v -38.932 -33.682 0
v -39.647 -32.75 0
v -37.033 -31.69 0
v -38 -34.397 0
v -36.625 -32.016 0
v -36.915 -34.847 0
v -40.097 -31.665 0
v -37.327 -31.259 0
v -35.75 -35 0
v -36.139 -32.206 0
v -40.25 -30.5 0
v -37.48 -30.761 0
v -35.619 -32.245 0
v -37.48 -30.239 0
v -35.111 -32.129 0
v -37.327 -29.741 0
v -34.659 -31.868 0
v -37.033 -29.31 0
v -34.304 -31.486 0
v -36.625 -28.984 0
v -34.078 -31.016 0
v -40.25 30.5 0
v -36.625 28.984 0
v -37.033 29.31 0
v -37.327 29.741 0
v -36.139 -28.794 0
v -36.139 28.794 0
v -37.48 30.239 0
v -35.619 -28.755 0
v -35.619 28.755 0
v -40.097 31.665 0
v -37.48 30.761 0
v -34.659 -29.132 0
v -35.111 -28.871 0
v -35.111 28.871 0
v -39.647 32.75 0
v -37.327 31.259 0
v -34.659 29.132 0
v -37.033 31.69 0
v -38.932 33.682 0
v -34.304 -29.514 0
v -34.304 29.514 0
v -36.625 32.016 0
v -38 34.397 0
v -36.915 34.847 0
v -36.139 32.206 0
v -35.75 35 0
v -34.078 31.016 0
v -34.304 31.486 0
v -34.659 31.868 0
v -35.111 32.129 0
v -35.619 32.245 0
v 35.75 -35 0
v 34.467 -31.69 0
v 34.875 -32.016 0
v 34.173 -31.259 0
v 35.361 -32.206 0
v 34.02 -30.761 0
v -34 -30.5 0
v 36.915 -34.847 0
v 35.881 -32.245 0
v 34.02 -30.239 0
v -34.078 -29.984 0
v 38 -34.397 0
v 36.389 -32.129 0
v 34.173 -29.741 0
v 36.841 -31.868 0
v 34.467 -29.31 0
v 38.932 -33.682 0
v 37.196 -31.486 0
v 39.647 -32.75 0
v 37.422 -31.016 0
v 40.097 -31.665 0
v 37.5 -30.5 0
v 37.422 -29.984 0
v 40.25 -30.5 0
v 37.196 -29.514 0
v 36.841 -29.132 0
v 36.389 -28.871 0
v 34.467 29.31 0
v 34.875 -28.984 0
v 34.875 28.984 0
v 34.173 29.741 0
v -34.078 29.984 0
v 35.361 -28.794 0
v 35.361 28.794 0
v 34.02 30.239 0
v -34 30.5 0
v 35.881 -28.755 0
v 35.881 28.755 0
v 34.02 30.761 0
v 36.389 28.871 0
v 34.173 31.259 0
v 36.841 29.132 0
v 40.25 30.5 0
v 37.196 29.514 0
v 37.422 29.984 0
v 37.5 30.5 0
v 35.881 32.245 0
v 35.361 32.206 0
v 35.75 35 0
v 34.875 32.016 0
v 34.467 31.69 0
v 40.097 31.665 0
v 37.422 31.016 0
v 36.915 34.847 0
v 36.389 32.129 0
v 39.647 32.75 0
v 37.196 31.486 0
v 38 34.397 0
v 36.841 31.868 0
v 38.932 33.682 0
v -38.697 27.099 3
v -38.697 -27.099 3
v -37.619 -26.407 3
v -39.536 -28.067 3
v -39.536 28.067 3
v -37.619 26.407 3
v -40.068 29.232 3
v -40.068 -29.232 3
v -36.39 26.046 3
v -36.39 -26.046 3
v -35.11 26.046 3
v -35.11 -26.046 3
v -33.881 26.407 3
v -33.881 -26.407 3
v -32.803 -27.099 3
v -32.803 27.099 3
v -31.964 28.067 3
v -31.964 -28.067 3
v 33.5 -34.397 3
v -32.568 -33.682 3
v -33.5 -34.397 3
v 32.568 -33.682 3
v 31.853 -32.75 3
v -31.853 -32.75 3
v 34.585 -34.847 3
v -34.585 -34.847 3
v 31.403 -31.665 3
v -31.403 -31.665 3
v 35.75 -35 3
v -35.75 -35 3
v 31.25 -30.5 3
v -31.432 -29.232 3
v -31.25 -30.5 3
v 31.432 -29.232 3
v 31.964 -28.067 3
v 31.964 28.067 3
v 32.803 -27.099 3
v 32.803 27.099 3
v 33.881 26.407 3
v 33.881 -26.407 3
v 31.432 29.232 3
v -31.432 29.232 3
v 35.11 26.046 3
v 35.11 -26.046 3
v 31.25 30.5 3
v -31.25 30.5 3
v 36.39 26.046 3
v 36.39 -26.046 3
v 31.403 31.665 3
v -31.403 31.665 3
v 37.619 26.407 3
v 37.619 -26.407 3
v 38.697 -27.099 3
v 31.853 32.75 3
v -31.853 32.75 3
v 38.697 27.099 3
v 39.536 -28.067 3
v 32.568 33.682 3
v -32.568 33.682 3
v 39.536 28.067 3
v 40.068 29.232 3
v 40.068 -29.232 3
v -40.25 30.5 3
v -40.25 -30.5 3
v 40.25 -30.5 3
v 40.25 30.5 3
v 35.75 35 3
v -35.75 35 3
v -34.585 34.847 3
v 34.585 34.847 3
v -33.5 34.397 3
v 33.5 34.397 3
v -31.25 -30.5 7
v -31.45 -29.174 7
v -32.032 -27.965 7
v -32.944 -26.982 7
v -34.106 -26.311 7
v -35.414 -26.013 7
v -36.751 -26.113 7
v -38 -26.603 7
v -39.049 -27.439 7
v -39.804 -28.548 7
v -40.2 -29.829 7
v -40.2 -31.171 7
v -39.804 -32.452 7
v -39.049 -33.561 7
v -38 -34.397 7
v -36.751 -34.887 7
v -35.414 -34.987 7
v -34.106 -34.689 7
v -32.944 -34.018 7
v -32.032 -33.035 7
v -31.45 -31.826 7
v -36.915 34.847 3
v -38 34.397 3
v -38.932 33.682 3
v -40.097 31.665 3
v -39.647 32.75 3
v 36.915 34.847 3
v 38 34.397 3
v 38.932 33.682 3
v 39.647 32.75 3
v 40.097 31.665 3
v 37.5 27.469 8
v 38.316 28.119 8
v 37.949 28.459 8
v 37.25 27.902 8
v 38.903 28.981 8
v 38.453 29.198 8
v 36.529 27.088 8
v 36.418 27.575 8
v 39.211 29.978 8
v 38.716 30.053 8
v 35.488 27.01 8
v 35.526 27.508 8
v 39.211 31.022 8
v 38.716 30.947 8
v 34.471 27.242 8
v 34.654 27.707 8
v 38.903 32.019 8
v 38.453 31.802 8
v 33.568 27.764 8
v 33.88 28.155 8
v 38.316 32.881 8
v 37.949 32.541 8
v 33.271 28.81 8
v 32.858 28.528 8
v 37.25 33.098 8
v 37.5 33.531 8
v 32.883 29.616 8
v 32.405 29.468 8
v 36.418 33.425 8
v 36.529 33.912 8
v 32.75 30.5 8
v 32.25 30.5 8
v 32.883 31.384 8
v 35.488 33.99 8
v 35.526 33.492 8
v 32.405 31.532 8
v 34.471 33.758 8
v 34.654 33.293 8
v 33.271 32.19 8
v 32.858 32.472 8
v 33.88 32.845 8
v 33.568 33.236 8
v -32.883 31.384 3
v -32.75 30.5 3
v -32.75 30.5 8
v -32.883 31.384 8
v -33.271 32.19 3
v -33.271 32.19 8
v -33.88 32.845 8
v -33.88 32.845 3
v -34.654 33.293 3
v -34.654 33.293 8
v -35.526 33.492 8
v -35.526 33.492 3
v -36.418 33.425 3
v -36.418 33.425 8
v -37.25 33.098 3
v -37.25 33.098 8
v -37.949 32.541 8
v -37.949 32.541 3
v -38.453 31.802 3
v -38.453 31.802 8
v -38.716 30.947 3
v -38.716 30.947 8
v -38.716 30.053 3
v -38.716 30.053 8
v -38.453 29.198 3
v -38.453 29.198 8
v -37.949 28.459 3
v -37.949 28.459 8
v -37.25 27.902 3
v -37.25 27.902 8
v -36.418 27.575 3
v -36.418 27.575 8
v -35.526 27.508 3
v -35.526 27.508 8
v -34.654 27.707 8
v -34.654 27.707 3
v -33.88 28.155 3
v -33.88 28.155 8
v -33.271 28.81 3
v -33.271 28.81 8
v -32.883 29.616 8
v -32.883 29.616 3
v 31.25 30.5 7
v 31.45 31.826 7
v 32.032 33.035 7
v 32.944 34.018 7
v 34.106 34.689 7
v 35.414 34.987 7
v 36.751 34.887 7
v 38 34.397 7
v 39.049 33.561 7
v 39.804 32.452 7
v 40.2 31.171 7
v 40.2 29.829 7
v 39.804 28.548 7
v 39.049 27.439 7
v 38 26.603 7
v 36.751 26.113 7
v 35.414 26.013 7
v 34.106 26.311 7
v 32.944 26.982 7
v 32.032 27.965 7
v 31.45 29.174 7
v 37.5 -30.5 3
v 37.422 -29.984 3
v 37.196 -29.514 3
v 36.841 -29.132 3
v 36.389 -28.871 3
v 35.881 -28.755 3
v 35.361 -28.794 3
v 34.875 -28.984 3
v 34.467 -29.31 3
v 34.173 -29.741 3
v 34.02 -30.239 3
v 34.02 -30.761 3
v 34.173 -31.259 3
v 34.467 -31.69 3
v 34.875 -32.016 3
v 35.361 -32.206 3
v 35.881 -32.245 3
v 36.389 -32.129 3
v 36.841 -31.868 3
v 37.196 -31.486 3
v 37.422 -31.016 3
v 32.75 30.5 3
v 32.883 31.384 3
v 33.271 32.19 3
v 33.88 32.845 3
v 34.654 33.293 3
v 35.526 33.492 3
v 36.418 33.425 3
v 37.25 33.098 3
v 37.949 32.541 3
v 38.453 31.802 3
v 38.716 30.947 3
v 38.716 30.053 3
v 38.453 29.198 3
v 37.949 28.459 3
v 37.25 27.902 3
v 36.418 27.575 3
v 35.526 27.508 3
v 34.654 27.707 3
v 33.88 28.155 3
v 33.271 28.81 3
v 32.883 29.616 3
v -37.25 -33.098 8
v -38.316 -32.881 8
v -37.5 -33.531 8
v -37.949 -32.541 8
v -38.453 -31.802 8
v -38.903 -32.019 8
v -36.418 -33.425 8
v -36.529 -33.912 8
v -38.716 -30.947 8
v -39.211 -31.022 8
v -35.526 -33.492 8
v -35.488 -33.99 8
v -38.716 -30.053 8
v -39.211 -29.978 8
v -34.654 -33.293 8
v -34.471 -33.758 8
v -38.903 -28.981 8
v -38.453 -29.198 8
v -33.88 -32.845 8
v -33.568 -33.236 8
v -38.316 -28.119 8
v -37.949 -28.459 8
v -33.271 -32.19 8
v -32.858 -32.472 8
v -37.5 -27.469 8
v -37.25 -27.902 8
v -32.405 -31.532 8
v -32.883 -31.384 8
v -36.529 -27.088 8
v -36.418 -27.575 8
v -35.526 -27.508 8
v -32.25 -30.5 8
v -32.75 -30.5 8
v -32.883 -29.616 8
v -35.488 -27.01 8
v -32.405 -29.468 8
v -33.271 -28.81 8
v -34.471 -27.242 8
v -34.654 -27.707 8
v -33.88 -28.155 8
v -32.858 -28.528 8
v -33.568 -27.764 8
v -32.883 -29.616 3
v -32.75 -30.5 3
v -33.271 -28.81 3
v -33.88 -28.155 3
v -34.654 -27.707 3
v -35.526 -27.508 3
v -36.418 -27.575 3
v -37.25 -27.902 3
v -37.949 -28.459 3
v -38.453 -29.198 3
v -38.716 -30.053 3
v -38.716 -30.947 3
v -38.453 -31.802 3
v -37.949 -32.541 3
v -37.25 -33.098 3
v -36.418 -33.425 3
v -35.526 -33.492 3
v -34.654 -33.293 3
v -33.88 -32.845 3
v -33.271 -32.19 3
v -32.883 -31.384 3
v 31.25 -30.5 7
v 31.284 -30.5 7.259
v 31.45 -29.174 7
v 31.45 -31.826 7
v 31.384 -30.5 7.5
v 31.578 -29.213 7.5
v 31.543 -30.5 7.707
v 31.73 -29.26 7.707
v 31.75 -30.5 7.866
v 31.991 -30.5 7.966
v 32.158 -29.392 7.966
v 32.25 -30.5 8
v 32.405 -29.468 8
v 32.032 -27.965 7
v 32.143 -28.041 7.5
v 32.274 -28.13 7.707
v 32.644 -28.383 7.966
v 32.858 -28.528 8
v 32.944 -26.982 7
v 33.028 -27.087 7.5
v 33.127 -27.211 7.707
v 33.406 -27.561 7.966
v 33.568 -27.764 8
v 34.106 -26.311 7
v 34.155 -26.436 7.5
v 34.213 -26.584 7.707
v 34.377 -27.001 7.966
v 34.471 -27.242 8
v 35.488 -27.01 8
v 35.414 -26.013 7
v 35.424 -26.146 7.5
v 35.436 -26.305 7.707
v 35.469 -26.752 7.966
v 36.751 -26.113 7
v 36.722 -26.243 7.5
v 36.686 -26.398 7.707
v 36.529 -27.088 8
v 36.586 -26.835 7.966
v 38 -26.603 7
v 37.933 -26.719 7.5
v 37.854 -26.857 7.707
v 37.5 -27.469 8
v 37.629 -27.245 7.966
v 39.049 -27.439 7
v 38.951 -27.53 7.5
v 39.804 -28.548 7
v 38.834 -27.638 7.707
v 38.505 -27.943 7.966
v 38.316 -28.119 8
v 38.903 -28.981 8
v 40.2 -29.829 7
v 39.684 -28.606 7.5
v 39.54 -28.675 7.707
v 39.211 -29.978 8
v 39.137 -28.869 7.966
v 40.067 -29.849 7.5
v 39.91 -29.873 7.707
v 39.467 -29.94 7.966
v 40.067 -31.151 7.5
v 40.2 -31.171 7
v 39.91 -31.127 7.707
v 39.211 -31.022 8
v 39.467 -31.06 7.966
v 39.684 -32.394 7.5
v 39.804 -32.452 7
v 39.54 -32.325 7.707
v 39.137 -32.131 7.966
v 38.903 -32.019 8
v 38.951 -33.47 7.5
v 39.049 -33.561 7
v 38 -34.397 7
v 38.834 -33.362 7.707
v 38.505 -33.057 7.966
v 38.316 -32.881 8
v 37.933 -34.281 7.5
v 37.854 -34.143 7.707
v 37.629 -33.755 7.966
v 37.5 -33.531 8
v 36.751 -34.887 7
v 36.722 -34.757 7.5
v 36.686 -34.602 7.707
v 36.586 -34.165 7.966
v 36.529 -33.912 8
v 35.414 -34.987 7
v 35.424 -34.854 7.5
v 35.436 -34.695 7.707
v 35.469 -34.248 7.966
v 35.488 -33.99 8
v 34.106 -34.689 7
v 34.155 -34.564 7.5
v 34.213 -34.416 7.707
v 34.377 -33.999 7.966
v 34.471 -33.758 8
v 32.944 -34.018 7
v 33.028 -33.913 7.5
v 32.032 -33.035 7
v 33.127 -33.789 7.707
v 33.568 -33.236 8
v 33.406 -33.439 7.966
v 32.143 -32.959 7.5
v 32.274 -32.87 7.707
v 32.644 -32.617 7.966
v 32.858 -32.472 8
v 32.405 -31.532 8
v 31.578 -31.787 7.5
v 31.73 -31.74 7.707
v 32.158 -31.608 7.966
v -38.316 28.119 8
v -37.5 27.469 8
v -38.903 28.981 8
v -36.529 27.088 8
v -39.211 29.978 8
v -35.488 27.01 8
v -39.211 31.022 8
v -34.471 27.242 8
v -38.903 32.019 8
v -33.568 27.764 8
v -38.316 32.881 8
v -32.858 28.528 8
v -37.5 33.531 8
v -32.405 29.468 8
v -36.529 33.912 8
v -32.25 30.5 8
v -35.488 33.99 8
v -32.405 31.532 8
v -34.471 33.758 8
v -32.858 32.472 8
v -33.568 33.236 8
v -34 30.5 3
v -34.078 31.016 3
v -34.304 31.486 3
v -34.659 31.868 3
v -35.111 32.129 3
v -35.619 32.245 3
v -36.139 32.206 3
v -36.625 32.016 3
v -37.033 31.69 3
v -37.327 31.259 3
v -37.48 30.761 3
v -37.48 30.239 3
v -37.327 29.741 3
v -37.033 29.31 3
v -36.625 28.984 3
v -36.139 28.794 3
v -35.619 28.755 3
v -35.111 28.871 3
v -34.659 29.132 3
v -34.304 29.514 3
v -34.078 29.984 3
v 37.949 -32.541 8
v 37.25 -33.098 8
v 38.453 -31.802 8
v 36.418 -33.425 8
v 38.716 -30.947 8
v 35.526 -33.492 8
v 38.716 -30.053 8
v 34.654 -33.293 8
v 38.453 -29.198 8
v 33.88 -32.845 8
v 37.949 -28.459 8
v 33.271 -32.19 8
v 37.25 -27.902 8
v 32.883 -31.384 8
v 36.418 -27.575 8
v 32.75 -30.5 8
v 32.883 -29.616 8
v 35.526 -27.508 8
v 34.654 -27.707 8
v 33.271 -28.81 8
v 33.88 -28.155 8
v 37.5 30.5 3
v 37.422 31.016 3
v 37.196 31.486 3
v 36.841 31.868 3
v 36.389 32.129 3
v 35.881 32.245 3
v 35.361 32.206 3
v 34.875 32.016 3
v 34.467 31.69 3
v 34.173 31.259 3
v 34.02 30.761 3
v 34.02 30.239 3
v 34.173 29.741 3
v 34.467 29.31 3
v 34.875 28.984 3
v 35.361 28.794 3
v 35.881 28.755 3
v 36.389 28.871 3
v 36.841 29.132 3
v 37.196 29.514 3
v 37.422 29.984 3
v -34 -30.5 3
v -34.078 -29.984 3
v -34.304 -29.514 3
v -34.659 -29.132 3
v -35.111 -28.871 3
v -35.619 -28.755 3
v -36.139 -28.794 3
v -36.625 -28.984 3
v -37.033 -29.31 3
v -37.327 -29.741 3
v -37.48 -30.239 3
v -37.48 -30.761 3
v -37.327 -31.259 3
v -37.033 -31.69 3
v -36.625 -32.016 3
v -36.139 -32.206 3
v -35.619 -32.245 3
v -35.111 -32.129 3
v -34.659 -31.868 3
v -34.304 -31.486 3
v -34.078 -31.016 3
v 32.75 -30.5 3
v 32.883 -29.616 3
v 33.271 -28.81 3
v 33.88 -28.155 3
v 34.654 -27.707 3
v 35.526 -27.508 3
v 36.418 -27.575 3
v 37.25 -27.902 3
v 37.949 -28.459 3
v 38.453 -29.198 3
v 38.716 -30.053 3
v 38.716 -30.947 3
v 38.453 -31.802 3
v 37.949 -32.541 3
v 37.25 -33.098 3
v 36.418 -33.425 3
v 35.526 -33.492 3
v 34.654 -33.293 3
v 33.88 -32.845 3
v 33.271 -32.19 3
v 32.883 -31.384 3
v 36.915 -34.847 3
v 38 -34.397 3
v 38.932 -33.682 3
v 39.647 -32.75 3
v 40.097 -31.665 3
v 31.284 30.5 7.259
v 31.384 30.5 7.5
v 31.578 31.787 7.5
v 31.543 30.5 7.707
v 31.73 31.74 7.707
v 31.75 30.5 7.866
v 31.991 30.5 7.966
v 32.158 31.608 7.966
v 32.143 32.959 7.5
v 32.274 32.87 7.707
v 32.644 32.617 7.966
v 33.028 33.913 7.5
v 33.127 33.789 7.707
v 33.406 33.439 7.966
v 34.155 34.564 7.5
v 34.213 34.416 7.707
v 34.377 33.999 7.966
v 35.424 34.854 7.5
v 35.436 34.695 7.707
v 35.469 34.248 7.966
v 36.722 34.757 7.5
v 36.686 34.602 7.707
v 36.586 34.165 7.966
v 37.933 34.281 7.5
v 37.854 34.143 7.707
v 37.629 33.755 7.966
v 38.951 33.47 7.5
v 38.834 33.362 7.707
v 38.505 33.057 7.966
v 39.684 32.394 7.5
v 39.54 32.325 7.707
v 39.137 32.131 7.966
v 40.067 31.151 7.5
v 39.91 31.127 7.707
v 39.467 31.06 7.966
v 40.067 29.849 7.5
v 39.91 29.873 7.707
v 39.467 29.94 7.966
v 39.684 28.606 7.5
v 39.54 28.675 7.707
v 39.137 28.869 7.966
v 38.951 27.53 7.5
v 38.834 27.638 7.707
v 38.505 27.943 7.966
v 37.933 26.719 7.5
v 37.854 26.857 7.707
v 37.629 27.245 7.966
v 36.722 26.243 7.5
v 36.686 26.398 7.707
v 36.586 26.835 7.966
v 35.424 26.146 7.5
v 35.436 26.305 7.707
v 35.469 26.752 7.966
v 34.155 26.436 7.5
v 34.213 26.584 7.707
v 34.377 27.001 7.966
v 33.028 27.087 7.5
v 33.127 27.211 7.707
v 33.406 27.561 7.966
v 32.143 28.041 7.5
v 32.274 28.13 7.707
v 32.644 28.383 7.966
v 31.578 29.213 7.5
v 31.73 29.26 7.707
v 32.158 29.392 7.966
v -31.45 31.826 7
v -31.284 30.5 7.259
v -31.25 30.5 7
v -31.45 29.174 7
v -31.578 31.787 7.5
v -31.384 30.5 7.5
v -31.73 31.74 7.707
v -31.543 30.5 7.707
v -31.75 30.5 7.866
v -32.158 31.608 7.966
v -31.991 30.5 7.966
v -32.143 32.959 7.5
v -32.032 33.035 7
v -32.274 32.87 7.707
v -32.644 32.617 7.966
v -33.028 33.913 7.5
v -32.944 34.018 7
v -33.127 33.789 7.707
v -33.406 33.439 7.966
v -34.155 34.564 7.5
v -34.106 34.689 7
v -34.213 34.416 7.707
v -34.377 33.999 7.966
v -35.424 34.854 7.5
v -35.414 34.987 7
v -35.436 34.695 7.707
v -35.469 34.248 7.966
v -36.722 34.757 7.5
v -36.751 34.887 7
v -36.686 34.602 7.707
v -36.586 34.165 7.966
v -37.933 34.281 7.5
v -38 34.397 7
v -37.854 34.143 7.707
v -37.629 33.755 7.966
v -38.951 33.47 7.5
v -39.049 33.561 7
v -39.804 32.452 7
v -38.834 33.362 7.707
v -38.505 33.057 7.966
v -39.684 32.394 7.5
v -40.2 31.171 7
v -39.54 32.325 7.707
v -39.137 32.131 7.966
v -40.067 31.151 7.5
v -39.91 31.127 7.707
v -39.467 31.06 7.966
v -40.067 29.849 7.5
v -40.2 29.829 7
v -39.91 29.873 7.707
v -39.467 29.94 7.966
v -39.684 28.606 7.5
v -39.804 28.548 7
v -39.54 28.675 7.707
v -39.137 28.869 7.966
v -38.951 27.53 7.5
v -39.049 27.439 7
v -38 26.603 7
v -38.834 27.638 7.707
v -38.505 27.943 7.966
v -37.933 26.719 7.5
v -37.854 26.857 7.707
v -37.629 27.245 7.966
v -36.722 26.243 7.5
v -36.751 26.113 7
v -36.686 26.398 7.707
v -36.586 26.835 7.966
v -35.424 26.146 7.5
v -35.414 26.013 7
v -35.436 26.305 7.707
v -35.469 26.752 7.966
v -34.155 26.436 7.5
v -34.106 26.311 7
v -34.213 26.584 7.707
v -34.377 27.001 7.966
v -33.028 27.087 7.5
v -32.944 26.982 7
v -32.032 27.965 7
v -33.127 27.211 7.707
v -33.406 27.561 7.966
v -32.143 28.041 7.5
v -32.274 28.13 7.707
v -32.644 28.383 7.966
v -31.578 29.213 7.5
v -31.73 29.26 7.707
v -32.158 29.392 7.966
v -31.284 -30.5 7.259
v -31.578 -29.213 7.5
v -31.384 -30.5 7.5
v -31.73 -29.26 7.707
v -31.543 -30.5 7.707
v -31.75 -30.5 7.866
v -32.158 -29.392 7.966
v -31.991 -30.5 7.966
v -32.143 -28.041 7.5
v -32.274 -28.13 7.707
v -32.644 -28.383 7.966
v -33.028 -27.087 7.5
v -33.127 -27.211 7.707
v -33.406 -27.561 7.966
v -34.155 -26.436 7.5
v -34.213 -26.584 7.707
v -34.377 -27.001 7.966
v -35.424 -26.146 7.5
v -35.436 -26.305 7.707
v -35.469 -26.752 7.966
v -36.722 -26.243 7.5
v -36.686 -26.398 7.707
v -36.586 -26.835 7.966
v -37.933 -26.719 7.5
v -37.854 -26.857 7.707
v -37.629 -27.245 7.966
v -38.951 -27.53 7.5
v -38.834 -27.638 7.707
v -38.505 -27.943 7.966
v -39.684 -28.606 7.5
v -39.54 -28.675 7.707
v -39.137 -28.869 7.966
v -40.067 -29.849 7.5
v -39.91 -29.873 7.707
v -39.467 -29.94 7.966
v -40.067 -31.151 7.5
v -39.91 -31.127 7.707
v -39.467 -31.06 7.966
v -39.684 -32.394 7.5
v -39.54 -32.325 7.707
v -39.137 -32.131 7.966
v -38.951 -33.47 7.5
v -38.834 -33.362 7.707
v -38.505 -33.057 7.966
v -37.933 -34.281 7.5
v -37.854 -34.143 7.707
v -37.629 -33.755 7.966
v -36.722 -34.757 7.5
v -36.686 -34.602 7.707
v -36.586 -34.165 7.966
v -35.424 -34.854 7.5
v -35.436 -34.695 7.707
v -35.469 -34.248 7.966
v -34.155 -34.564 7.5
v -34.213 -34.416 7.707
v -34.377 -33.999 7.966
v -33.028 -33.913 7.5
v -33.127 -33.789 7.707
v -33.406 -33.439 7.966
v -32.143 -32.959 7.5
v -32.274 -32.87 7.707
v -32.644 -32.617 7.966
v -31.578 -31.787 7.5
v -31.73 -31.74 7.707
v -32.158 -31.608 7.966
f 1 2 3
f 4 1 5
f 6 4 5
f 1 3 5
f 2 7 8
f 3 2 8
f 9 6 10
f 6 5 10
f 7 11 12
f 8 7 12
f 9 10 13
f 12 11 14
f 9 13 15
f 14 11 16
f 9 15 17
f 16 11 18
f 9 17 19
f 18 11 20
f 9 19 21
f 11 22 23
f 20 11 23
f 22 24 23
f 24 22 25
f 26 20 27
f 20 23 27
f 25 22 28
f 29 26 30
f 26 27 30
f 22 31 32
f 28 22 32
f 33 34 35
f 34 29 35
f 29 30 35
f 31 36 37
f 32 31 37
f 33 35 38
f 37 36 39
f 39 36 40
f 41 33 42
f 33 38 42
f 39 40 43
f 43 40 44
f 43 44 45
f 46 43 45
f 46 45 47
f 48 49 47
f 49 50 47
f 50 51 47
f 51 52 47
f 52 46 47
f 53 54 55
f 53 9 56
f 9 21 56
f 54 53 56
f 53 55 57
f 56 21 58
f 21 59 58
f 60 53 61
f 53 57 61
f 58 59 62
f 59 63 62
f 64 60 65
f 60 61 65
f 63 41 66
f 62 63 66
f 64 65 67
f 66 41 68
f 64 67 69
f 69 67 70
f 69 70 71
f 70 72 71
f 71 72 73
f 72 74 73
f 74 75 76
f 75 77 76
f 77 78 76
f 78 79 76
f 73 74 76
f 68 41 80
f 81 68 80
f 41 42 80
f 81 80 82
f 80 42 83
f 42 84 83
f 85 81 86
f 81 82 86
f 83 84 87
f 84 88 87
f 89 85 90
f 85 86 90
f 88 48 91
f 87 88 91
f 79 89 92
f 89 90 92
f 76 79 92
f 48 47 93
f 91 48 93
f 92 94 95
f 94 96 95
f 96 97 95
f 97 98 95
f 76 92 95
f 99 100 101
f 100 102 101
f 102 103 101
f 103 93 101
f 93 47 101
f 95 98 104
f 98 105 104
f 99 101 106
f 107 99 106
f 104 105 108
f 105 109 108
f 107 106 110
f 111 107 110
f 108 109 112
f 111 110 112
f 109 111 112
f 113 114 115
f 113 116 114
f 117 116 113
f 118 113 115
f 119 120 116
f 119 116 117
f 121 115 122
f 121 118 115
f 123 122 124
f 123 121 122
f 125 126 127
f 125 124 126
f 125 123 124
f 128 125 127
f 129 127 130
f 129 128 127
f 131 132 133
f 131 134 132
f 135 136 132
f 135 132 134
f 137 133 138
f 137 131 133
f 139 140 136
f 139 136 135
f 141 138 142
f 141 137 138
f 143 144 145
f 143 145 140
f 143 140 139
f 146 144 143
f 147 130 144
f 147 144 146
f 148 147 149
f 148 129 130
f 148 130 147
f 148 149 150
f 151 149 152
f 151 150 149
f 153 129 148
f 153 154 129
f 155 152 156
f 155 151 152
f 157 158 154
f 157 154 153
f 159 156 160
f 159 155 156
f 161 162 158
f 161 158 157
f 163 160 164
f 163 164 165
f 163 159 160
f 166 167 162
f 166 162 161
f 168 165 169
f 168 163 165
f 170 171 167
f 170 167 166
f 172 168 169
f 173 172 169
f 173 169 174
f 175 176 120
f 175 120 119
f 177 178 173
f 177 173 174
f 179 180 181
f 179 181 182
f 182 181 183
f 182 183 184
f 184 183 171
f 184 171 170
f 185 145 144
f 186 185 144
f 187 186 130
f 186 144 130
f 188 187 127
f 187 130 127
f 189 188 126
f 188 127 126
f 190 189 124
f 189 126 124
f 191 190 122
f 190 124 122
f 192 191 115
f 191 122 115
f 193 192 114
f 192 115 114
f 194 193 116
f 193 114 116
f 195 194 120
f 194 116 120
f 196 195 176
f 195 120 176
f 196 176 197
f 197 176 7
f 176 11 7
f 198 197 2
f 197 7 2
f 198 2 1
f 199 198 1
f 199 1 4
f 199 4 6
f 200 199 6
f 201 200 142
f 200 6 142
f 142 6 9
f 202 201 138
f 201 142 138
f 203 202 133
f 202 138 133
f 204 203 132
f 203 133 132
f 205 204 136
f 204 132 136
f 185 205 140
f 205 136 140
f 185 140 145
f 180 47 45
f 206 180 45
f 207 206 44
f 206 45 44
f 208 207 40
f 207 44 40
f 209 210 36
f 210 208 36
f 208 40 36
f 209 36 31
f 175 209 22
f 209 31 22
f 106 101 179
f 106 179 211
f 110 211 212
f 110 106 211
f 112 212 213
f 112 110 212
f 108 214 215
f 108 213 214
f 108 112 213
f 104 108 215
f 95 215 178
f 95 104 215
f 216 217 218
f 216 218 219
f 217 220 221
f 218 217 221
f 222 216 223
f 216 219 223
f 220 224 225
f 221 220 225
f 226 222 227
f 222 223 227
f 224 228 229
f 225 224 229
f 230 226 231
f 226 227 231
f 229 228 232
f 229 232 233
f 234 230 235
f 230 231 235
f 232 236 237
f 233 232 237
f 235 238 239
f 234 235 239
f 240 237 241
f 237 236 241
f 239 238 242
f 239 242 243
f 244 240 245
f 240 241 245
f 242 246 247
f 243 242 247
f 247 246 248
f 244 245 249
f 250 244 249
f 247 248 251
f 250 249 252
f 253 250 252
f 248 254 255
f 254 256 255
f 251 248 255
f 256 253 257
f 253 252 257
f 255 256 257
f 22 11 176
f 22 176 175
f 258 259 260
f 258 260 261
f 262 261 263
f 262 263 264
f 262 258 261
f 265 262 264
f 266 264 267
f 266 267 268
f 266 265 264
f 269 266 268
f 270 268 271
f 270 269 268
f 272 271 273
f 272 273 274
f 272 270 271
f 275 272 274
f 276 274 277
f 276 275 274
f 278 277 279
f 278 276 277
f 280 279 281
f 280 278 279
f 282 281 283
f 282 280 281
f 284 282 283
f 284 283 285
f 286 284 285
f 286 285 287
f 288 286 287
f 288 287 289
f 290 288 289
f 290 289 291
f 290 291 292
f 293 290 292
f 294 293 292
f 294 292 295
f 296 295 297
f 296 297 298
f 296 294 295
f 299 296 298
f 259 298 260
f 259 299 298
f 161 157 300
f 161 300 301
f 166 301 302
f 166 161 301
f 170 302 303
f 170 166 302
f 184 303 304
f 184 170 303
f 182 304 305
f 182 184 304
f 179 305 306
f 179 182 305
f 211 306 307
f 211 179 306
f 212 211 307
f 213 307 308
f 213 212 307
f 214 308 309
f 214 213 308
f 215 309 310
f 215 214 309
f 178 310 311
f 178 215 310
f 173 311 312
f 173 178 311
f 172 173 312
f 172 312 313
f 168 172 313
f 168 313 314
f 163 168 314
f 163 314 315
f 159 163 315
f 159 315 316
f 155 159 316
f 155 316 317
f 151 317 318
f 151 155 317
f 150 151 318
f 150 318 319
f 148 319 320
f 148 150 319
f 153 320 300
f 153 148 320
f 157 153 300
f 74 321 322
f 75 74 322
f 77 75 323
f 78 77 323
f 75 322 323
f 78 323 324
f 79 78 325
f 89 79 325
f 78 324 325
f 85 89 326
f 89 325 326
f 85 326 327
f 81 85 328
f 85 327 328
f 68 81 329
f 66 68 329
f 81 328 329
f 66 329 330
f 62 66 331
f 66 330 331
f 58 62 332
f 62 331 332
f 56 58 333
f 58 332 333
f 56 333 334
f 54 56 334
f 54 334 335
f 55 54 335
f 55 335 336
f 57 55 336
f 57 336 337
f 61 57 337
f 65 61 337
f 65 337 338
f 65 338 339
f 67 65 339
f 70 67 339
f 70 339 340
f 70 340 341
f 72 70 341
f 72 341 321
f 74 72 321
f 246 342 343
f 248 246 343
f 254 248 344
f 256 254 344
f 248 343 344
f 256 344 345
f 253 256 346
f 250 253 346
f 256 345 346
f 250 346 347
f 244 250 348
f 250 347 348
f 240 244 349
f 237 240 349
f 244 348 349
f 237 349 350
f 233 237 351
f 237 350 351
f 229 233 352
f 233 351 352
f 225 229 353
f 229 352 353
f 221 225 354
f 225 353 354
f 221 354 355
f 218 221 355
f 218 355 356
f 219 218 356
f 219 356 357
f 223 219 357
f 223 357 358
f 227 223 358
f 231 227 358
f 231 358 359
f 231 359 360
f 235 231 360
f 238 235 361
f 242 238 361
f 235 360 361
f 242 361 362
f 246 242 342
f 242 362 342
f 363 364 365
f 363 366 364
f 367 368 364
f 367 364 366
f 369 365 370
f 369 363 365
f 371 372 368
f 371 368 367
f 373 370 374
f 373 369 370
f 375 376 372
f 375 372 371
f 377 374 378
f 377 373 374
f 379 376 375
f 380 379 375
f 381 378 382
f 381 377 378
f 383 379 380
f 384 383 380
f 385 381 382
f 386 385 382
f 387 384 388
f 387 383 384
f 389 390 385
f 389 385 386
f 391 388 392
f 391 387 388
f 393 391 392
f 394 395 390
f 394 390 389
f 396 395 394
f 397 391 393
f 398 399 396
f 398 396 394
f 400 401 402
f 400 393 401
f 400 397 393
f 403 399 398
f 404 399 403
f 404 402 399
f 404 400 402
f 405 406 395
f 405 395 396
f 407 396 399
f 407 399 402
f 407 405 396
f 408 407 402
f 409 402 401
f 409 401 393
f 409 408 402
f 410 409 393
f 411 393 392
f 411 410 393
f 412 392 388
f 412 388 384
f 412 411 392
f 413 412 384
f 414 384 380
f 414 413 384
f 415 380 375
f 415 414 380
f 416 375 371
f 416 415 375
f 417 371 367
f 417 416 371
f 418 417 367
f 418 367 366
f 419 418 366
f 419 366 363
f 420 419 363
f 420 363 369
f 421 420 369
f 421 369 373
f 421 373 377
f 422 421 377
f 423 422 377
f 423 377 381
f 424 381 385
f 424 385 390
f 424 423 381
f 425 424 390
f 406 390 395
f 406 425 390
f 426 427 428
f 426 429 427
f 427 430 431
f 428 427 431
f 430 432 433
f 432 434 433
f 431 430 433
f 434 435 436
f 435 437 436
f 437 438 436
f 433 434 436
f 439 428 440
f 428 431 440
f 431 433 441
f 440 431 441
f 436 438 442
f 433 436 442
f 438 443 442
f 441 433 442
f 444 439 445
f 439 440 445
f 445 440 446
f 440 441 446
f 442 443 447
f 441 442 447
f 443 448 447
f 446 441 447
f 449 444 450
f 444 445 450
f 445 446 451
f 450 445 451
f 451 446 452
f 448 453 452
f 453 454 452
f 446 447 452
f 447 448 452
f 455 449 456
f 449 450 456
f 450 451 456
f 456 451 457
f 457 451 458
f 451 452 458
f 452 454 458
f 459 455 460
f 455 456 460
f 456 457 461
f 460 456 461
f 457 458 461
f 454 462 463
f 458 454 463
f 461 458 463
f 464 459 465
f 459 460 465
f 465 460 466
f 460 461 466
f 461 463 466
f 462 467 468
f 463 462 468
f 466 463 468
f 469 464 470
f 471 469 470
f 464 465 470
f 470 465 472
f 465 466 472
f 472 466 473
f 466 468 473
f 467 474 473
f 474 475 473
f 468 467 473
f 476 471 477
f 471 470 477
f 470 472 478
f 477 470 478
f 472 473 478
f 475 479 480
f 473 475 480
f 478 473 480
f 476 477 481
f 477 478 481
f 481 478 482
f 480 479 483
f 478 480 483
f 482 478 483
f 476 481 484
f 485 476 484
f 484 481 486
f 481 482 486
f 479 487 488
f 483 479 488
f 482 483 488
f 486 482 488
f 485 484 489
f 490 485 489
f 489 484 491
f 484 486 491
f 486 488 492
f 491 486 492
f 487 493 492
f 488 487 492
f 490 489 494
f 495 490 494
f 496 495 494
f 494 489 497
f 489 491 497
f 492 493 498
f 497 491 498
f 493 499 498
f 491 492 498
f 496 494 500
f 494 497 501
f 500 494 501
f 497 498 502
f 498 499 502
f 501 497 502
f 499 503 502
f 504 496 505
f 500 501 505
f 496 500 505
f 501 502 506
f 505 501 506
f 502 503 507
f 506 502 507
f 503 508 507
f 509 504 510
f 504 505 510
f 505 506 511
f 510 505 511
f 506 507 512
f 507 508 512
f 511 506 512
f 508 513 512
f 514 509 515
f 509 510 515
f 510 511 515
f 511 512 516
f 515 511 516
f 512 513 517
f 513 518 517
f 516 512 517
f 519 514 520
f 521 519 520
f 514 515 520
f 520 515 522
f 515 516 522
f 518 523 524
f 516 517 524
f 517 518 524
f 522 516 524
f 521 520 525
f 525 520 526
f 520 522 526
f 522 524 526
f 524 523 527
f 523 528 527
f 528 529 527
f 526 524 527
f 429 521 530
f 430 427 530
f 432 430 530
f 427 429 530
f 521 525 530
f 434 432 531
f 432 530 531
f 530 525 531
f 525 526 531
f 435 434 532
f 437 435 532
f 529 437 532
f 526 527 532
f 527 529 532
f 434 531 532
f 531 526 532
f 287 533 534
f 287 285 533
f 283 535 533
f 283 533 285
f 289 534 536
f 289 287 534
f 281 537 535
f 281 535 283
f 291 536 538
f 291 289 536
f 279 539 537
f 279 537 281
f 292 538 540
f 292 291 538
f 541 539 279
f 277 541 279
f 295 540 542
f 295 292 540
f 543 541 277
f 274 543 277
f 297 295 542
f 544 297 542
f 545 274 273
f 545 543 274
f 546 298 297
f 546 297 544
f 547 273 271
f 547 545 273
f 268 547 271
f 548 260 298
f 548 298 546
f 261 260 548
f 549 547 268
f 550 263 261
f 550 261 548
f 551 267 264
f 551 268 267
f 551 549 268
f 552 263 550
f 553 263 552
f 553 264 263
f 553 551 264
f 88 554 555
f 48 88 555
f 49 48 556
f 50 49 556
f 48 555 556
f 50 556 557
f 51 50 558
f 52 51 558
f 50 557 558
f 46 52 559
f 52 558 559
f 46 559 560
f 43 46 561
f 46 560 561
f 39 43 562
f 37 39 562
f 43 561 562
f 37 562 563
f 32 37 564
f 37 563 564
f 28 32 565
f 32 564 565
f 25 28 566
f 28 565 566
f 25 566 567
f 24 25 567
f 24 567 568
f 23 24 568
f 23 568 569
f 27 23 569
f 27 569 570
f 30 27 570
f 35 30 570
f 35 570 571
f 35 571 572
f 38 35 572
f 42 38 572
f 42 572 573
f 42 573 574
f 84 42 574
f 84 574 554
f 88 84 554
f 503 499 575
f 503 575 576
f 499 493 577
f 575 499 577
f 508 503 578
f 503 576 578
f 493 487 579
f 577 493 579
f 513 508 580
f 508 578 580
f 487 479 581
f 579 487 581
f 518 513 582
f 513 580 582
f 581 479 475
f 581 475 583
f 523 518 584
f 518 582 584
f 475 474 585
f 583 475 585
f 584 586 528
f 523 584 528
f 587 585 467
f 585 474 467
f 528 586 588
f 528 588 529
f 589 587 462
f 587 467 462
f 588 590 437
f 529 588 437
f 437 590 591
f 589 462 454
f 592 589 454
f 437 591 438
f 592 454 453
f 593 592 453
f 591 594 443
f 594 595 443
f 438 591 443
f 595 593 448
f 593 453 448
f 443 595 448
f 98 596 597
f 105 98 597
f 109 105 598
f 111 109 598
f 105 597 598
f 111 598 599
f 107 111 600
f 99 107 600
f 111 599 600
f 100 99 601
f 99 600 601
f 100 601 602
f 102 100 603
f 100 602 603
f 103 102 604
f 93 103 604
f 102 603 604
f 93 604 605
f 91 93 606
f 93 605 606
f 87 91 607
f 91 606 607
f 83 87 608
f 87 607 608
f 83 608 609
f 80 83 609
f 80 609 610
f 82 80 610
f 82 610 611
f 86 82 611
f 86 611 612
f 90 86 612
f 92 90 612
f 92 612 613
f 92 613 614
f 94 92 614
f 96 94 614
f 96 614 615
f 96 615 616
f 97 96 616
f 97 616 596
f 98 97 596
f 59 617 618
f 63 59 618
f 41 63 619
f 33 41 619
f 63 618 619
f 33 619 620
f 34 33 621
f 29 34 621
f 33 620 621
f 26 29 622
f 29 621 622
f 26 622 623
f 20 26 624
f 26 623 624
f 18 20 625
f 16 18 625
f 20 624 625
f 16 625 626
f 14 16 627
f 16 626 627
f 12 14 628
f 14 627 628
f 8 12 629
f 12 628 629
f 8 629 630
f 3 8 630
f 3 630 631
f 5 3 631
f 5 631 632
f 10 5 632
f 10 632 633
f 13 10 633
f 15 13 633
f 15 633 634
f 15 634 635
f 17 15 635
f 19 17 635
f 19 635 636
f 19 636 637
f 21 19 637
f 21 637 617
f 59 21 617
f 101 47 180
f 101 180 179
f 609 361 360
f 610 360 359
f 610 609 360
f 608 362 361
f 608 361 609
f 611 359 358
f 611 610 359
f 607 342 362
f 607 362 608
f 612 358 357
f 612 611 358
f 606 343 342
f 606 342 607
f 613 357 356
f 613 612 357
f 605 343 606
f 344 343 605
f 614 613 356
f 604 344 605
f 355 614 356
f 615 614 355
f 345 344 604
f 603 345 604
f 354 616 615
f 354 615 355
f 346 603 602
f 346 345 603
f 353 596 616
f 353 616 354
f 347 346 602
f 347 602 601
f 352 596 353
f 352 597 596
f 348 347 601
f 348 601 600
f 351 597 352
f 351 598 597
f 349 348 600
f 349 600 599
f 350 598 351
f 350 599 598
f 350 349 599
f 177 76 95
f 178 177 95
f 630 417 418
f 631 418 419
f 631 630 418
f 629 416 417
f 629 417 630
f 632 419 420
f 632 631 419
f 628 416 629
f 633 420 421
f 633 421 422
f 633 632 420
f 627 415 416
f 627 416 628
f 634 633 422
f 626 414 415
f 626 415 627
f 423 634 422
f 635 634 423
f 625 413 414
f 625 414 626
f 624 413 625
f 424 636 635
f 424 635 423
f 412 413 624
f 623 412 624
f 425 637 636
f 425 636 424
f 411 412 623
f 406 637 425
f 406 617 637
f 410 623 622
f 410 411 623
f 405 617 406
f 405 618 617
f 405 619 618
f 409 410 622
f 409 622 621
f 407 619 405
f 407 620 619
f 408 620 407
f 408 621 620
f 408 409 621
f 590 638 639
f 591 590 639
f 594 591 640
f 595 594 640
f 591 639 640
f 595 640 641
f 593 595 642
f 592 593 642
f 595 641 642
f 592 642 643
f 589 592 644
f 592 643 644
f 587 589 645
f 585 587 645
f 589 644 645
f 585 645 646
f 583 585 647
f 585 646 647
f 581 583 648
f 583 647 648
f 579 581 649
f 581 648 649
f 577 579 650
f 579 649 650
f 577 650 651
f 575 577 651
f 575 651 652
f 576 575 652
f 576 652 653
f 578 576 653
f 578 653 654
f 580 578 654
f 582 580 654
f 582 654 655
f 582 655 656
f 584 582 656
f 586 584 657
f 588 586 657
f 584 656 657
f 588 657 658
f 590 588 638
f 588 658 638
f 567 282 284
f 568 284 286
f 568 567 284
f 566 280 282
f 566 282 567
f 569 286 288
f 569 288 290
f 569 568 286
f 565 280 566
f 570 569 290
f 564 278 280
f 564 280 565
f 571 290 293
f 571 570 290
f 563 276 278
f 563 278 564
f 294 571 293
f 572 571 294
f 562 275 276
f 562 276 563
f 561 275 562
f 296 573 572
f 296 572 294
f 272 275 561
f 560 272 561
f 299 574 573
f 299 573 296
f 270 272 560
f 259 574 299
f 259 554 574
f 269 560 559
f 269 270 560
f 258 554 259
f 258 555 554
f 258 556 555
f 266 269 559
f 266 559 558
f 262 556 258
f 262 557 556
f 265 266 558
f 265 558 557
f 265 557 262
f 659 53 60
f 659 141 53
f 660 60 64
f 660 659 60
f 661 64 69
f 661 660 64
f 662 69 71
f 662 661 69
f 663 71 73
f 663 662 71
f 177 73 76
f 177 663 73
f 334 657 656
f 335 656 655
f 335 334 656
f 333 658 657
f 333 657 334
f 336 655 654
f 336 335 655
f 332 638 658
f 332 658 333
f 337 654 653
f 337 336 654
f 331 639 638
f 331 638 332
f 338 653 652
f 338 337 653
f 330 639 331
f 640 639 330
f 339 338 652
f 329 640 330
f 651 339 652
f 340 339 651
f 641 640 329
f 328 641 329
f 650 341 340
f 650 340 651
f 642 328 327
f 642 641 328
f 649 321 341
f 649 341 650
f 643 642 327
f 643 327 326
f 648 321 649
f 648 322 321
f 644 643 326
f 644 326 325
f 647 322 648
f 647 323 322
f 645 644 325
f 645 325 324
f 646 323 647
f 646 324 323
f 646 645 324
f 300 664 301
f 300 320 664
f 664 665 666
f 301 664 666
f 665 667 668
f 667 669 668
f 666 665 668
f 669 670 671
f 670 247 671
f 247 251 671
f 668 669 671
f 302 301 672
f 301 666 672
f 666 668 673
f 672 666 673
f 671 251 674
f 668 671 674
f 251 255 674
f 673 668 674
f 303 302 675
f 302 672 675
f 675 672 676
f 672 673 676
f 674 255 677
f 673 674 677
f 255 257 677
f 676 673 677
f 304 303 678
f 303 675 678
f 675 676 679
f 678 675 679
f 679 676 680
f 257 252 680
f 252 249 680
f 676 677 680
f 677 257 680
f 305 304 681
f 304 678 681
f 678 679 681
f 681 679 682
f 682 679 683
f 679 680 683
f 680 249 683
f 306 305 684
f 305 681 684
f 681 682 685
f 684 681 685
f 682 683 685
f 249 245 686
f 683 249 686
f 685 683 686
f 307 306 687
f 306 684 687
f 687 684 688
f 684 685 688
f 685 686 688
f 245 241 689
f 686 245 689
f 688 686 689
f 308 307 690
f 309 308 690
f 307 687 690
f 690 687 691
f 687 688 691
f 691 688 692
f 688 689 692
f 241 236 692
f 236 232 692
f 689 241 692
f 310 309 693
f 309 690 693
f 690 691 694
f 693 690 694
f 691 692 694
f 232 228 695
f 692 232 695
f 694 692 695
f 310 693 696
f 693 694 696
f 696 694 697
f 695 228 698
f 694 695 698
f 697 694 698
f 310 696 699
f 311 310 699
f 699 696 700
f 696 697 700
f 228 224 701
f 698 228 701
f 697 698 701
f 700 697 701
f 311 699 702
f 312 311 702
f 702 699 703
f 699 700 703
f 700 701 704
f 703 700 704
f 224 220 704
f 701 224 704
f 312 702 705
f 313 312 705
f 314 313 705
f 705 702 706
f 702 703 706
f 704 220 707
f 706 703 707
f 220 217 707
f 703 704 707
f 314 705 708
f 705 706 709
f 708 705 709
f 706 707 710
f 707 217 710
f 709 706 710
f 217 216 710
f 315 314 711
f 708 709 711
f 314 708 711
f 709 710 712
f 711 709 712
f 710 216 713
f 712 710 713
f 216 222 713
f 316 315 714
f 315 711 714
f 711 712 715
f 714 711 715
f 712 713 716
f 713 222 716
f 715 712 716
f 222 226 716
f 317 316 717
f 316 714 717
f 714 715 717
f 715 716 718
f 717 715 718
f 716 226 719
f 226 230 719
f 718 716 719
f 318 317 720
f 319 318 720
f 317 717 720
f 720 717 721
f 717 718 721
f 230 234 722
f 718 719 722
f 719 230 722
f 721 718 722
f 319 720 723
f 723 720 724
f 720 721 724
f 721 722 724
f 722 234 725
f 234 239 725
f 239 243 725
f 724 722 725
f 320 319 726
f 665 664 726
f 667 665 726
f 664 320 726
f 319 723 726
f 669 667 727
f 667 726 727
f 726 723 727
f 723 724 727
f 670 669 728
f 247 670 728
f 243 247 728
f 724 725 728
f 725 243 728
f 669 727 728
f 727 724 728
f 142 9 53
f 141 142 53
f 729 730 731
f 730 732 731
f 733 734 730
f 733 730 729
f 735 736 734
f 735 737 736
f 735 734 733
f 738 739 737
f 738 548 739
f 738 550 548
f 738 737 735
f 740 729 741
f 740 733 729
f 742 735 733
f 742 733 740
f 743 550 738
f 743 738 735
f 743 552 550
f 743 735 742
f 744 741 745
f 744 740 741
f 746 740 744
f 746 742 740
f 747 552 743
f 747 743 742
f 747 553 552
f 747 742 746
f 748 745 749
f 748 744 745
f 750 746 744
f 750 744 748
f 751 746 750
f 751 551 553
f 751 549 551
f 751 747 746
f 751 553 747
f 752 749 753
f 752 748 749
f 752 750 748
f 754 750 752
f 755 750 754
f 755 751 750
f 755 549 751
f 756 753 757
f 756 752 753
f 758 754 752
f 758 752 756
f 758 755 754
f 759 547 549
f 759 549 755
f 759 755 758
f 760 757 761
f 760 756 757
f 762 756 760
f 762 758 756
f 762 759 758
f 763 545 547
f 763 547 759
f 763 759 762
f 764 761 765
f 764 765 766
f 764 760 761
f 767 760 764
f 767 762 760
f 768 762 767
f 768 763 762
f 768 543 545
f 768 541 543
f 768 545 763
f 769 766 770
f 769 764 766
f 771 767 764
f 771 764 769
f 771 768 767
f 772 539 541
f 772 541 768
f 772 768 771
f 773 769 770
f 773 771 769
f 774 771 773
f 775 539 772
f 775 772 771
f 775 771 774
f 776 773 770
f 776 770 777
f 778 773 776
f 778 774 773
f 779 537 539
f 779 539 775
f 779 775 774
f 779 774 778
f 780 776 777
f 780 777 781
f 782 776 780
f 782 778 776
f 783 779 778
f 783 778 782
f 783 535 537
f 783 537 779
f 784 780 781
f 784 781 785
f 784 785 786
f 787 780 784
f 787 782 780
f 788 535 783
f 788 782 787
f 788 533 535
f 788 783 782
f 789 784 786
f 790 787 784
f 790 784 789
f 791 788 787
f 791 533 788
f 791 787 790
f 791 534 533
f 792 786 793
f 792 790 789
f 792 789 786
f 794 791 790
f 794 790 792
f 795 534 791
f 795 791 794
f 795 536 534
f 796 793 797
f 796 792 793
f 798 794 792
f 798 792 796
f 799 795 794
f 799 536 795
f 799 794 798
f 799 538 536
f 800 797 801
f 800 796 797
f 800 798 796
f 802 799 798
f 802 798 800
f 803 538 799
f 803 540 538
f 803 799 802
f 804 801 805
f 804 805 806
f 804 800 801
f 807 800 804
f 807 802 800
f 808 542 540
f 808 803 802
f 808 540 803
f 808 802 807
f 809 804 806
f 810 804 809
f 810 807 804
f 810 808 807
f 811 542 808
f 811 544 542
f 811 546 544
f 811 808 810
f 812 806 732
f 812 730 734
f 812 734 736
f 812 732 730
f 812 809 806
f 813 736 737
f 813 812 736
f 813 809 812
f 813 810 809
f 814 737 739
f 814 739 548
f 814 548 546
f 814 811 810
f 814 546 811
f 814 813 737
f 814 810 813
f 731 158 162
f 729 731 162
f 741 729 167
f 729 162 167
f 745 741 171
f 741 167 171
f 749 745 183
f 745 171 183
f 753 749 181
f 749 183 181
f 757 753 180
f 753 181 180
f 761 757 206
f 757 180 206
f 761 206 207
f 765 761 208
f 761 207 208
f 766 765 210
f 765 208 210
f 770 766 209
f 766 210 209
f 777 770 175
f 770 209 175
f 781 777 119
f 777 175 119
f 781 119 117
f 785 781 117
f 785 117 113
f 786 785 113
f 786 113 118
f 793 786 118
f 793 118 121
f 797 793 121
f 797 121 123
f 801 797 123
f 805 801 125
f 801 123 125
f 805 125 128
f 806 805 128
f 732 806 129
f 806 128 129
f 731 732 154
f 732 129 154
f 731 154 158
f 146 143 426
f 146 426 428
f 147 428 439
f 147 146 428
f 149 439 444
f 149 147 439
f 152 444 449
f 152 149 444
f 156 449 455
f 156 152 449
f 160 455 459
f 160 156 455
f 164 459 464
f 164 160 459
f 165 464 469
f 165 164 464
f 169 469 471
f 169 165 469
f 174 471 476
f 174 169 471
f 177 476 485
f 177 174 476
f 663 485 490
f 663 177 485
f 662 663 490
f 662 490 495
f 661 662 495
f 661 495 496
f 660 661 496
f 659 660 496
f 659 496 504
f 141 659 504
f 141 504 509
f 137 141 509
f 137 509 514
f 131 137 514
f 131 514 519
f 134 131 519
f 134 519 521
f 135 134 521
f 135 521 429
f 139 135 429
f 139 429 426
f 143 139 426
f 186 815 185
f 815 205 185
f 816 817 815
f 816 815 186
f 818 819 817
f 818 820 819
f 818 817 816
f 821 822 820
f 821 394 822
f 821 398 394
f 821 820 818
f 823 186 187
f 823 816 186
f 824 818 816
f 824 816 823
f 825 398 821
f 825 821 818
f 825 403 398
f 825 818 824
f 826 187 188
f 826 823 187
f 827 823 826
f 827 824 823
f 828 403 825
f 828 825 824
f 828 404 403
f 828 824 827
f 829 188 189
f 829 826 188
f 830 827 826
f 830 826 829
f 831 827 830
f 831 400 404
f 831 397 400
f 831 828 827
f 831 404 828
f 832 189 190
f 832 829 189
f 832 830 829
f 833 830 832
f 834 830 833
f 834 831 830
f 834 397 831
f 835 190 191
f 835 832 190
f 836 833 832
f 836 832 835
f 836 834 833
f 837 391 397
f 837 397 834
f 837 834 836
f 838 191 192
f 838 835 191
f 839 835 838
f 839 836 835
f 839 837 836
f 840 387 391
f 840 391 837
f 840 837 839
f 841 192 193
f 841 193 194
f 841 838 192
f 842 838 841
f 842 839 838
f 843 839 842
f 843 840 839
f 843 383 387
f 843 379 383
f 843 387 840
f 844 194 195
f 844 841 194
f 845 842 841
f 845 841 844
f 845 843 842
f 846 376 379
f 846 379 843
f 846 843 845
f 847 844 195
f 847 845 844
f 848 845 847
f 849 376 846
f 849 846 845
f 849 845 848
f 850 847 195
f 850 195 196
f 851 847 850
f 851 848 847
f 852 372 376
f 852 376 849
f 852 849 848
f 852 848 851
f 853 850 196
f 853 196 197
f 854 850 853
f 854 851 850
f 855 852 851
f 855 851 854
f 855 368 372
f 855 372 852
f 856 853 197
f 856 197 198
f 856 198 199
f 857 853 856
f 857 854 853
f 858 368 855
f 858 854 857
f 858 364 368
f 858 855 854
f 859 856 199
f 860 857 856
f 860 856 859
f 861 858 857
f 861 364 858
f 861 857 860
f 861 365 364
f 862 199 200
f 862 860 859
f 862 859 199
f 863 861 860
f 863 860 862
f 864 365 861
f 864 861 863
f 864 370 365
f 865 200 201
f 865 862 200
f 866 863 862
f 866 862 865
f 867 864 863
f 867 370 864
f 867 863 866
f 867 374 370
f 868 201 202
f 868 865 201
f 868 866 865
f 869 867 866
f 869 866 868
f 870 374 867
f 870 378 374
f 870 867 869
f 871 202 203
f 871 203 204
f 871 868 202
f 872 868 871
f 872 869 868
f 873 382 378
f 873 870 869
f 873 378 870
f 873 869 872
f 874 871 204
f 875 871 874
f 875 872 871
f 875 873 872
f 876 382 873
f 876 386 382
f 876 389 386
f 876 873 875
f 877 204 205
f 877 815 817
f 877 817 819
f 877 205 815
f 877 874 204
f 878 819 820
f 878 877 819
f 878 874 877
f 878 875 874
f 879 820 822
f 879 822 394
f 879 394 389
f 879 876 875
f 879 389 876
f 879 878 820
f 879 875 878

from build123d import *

# Parameters (mm, degrees)
SKETCH_W      = 80.5
SKETCH_H      = 70
PAD_DEPTH     = 3
FILLET_R      = 4.5
SKETCH001_R   = 1.75
POCKET_DEPTH  = 3.001
SKETCH002_R   = 4.5
SKETCH002_R_2 = 3
PAD001_DEPTH  = 5
FILLET001_R   = 1


with BuildPart() as part:
    # Sketch → Pad (new body)
    with BuildSketch(Plane.XY):
        Rectangle(SKETCH_W, SKETCH_H)
    extrude(amount=PAD_DEPTH)

    # Fillet
    fillet_edges = [part.edges().sort_by_distance(p)[0] for p in [
        (-40.25, -35, 1.5),
        (40.25, -35, 1.5),
        (40.25, 35, 1.5),
        (-40.25, 35, 1.5),
    ]]
    fillet(fillet_edges, radius=FILLET_R)

    # Sketch001 (on Face5 of Fillet) → Pocket (cut, through all)
    with BuildSketch(Plane.XY.offset(3)):
        with Locations((-35.75, -30.5)):
            Circle(SKETCH001_R)
        with Locations((35.75, -30.5)):
            Circle(SKETCH001_R)
        with Locations((35.75, 30.5)):
            Circle(SKETCH001_R)
        with Locations((-35.75, 30.5)):
            Circle(SKETCH001_R)
    extrude(amount=-POCKET_DEPTH, mode=Mode.SUBTRACT)

    # Sketch002 (on Face5 of Pocket) → Pad001 (join)
    with BuildSketch(Plane.XY.offset(3)):
        with Locations((-35.75, 30.5)):
            Circle(SKETCH002_R)
        with Locations((-35.75, 30.5)):
            Circle(SKETCH002_R_2, mode=Mode.SUBTRACT)
        with Locations((-35.75, -30.5)):
            Circle(SKETCH002_R)
        with Locations((-35.75, -30.5)):
            Circle(SKETCH002_R_2, mode=Mode.SUBTRACT)
    pad001 = extrude(amount=PAD001_DEPTH)

    # Mirrored: Pad001 across YZ
    add(pad001.mirror(Plane.YZ))

    # Fillet001
    fillet001_edges = [part.edges().sort_by_distance(p)[0] for p in [
        (-40.25, -30.5, 8),
        (-40.25, 30.5, 8),
        (40.25, 30.5, 8),
        (40.25, -30.5, 8),
    ]]
    fillet(fillet001_edges, radius=FILLET001_R)


solid = part.part
